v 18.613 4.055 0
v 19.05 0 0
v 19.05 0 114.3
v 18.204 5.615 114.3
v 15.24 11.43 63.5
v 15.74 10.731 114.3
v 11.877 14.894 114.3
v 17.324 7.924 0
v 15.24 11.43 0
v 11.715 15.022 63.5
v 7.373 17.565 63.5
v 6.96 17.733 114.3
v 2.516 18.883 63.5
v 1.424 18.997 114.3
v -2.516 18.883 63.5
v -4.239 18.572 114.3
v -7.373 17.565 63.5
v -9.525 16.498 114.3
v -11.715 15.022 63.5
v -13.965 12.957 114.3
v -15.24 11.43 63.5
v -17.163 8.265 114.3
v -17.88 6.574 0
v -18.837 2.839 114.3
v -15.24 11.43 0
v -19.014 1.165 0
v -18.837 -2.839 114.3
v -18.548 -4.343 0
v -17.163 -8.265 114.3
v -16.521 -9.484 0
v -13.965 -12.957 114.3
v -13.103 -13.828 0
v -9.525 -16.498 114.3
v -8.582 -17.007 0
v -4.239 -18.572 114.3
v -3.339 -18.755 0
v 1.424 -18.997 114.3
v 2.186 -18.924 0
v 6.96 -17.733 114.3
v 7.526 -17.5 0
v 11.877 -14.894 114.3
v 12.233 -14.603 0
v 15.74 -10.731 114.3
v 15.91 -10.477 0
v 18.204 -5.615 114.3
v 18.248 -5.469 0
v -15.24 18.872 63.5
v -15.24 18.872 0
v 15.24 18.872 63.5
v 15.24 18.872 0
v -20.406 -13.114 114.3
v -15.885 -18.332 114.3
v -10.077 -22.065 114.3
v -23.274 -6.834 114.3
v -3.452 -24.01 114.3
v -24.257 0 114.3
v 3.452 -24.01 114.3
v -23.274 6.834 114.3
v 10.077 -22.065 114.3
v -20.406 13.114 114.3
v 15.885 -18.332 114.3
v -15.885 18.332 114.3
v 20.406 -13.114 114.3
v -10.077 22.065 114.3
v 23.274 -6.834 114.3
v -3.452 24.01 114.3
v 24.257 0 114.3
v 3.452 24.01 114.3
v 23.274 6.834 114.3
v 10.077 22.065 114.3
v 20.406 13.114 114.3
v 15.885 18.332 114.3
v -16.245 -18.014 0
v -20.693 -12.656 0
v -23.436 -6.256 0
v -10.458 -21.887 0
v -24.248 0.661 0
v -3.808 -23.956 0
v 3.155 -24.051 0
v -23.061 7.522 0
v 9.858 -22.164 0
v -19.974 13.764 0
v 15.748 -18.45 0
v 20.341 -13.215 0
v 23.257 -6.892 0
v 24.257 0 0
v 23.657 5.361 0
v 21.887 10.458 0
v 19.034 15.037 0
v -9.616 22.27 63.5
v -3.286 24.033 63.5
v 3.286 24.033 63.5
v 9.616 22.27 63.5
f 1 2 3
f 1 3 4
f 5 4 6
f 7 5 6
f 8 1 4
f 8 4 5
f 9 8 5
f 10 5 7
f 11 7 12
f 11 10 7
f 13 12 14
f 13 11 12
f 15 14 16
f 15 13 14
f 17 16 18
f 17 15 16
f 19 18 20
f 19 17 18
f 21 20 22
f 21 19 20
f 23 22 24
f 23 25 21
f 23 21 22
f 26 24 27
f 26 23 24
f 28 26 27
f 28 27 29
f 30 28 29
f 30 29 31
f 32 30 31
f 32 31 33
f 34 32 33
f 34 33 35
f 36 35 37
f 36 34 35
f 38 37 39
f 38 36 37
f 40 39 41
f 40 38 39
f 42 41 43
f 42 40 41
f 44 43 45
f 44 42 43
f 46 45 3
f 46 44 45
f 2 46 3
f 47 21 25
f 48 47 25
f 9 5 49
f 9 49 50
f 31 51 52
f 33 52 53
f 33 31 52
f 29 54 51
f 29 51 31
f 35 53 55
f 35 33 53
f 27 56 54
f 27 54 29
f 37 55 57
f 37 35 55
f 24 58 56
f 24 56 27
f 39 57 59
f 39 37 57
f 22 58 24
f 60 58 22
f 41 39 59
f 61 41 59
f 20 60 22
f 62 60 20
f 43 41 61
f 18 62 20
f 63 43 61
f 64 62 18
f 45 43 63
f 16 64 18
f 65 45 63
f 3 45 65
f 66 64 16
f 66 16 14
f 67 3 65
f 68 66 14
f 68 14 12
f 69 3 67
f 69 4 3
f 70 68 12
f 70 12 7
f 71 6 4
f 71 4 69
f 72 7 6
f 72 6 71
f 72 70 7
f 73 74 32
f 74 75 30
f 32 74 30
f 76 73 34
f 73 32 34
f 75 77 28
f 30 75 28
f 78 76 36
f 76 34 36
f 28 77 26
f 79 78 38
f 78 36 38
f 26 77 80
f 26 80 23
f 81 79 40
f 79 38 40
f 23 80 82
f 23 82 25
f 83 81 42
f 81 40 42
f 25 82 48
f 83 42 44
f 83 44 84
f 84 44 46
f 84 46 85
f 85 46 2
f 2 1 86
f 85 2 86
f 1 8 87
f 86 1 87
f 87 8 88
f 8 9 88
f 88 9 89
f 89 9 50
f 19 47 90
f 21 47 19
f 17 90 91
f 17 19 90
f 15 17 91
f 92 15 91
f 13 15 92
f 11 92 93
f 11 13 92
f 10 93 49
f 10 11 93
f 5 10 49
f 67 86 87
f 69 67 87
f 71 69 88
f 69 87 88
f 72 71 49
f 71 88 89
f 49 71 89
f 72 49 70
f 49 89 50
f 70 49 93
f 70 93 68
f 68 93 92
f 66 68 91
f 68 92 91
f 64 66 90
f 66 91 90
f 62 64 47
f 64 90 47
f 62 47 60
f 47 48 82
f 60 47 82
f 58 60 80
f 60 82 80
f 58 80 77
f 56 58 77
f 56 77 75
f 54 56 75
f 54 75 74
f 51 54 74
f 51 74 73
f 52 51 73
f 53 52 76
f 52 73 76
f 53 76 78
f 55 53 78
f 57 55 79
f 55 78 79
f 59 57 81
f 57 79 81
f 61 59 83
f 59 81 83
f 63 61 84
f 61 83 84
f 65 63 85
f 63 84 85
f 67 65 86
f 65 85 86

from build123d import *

# Parameters (mm, degrees)
SKETCH1_R               = 24.257
SKETCH1_R_2             = 19.05
BOSS_EXTRUDE1_DEPTH     = 114.3
CUT_EXTRUDE1_DEPTH      = 120.336893281
CUT_EXTRUDE1_DEPTH_BACK = 2.54
SKETCH2_W               = 30.48
SKETCH2_H               = 63.5


with BuildPart() as part:
    # Sketch1 → Boss-Extrude1 (new body)
    with BuildSketch(Plane.XY):
        Circle(SKETCH1_R)
        Circle(SKETCH1_R_2, mode=Mode.SUBTRACT)
    extrude(amount=BOSS_EXTRUDE1_DEPTH)

    # Sketch2 → Cut-Extrude1 (cut, two sides: drawn at the far end of the back side and taken through both)
    with BuildSketch(Plane(origin=(0, 0, 0), x_dir=(1, 0, 0), z_dir=(0, 1, 0)).offset(-CUT_EXTRUDE1_DEPTH_BACK)):
        with Locations((0, -31.75)):
            Rectangle(SKETCH2_W, SKETCH2_H)
    extrude(amount=CUT_EXTRUDE1_DEPTH + CUT_EXTRUDE1_DEPTH_BACK, mode=Mode.SUBTRACT)


solid = part.part
